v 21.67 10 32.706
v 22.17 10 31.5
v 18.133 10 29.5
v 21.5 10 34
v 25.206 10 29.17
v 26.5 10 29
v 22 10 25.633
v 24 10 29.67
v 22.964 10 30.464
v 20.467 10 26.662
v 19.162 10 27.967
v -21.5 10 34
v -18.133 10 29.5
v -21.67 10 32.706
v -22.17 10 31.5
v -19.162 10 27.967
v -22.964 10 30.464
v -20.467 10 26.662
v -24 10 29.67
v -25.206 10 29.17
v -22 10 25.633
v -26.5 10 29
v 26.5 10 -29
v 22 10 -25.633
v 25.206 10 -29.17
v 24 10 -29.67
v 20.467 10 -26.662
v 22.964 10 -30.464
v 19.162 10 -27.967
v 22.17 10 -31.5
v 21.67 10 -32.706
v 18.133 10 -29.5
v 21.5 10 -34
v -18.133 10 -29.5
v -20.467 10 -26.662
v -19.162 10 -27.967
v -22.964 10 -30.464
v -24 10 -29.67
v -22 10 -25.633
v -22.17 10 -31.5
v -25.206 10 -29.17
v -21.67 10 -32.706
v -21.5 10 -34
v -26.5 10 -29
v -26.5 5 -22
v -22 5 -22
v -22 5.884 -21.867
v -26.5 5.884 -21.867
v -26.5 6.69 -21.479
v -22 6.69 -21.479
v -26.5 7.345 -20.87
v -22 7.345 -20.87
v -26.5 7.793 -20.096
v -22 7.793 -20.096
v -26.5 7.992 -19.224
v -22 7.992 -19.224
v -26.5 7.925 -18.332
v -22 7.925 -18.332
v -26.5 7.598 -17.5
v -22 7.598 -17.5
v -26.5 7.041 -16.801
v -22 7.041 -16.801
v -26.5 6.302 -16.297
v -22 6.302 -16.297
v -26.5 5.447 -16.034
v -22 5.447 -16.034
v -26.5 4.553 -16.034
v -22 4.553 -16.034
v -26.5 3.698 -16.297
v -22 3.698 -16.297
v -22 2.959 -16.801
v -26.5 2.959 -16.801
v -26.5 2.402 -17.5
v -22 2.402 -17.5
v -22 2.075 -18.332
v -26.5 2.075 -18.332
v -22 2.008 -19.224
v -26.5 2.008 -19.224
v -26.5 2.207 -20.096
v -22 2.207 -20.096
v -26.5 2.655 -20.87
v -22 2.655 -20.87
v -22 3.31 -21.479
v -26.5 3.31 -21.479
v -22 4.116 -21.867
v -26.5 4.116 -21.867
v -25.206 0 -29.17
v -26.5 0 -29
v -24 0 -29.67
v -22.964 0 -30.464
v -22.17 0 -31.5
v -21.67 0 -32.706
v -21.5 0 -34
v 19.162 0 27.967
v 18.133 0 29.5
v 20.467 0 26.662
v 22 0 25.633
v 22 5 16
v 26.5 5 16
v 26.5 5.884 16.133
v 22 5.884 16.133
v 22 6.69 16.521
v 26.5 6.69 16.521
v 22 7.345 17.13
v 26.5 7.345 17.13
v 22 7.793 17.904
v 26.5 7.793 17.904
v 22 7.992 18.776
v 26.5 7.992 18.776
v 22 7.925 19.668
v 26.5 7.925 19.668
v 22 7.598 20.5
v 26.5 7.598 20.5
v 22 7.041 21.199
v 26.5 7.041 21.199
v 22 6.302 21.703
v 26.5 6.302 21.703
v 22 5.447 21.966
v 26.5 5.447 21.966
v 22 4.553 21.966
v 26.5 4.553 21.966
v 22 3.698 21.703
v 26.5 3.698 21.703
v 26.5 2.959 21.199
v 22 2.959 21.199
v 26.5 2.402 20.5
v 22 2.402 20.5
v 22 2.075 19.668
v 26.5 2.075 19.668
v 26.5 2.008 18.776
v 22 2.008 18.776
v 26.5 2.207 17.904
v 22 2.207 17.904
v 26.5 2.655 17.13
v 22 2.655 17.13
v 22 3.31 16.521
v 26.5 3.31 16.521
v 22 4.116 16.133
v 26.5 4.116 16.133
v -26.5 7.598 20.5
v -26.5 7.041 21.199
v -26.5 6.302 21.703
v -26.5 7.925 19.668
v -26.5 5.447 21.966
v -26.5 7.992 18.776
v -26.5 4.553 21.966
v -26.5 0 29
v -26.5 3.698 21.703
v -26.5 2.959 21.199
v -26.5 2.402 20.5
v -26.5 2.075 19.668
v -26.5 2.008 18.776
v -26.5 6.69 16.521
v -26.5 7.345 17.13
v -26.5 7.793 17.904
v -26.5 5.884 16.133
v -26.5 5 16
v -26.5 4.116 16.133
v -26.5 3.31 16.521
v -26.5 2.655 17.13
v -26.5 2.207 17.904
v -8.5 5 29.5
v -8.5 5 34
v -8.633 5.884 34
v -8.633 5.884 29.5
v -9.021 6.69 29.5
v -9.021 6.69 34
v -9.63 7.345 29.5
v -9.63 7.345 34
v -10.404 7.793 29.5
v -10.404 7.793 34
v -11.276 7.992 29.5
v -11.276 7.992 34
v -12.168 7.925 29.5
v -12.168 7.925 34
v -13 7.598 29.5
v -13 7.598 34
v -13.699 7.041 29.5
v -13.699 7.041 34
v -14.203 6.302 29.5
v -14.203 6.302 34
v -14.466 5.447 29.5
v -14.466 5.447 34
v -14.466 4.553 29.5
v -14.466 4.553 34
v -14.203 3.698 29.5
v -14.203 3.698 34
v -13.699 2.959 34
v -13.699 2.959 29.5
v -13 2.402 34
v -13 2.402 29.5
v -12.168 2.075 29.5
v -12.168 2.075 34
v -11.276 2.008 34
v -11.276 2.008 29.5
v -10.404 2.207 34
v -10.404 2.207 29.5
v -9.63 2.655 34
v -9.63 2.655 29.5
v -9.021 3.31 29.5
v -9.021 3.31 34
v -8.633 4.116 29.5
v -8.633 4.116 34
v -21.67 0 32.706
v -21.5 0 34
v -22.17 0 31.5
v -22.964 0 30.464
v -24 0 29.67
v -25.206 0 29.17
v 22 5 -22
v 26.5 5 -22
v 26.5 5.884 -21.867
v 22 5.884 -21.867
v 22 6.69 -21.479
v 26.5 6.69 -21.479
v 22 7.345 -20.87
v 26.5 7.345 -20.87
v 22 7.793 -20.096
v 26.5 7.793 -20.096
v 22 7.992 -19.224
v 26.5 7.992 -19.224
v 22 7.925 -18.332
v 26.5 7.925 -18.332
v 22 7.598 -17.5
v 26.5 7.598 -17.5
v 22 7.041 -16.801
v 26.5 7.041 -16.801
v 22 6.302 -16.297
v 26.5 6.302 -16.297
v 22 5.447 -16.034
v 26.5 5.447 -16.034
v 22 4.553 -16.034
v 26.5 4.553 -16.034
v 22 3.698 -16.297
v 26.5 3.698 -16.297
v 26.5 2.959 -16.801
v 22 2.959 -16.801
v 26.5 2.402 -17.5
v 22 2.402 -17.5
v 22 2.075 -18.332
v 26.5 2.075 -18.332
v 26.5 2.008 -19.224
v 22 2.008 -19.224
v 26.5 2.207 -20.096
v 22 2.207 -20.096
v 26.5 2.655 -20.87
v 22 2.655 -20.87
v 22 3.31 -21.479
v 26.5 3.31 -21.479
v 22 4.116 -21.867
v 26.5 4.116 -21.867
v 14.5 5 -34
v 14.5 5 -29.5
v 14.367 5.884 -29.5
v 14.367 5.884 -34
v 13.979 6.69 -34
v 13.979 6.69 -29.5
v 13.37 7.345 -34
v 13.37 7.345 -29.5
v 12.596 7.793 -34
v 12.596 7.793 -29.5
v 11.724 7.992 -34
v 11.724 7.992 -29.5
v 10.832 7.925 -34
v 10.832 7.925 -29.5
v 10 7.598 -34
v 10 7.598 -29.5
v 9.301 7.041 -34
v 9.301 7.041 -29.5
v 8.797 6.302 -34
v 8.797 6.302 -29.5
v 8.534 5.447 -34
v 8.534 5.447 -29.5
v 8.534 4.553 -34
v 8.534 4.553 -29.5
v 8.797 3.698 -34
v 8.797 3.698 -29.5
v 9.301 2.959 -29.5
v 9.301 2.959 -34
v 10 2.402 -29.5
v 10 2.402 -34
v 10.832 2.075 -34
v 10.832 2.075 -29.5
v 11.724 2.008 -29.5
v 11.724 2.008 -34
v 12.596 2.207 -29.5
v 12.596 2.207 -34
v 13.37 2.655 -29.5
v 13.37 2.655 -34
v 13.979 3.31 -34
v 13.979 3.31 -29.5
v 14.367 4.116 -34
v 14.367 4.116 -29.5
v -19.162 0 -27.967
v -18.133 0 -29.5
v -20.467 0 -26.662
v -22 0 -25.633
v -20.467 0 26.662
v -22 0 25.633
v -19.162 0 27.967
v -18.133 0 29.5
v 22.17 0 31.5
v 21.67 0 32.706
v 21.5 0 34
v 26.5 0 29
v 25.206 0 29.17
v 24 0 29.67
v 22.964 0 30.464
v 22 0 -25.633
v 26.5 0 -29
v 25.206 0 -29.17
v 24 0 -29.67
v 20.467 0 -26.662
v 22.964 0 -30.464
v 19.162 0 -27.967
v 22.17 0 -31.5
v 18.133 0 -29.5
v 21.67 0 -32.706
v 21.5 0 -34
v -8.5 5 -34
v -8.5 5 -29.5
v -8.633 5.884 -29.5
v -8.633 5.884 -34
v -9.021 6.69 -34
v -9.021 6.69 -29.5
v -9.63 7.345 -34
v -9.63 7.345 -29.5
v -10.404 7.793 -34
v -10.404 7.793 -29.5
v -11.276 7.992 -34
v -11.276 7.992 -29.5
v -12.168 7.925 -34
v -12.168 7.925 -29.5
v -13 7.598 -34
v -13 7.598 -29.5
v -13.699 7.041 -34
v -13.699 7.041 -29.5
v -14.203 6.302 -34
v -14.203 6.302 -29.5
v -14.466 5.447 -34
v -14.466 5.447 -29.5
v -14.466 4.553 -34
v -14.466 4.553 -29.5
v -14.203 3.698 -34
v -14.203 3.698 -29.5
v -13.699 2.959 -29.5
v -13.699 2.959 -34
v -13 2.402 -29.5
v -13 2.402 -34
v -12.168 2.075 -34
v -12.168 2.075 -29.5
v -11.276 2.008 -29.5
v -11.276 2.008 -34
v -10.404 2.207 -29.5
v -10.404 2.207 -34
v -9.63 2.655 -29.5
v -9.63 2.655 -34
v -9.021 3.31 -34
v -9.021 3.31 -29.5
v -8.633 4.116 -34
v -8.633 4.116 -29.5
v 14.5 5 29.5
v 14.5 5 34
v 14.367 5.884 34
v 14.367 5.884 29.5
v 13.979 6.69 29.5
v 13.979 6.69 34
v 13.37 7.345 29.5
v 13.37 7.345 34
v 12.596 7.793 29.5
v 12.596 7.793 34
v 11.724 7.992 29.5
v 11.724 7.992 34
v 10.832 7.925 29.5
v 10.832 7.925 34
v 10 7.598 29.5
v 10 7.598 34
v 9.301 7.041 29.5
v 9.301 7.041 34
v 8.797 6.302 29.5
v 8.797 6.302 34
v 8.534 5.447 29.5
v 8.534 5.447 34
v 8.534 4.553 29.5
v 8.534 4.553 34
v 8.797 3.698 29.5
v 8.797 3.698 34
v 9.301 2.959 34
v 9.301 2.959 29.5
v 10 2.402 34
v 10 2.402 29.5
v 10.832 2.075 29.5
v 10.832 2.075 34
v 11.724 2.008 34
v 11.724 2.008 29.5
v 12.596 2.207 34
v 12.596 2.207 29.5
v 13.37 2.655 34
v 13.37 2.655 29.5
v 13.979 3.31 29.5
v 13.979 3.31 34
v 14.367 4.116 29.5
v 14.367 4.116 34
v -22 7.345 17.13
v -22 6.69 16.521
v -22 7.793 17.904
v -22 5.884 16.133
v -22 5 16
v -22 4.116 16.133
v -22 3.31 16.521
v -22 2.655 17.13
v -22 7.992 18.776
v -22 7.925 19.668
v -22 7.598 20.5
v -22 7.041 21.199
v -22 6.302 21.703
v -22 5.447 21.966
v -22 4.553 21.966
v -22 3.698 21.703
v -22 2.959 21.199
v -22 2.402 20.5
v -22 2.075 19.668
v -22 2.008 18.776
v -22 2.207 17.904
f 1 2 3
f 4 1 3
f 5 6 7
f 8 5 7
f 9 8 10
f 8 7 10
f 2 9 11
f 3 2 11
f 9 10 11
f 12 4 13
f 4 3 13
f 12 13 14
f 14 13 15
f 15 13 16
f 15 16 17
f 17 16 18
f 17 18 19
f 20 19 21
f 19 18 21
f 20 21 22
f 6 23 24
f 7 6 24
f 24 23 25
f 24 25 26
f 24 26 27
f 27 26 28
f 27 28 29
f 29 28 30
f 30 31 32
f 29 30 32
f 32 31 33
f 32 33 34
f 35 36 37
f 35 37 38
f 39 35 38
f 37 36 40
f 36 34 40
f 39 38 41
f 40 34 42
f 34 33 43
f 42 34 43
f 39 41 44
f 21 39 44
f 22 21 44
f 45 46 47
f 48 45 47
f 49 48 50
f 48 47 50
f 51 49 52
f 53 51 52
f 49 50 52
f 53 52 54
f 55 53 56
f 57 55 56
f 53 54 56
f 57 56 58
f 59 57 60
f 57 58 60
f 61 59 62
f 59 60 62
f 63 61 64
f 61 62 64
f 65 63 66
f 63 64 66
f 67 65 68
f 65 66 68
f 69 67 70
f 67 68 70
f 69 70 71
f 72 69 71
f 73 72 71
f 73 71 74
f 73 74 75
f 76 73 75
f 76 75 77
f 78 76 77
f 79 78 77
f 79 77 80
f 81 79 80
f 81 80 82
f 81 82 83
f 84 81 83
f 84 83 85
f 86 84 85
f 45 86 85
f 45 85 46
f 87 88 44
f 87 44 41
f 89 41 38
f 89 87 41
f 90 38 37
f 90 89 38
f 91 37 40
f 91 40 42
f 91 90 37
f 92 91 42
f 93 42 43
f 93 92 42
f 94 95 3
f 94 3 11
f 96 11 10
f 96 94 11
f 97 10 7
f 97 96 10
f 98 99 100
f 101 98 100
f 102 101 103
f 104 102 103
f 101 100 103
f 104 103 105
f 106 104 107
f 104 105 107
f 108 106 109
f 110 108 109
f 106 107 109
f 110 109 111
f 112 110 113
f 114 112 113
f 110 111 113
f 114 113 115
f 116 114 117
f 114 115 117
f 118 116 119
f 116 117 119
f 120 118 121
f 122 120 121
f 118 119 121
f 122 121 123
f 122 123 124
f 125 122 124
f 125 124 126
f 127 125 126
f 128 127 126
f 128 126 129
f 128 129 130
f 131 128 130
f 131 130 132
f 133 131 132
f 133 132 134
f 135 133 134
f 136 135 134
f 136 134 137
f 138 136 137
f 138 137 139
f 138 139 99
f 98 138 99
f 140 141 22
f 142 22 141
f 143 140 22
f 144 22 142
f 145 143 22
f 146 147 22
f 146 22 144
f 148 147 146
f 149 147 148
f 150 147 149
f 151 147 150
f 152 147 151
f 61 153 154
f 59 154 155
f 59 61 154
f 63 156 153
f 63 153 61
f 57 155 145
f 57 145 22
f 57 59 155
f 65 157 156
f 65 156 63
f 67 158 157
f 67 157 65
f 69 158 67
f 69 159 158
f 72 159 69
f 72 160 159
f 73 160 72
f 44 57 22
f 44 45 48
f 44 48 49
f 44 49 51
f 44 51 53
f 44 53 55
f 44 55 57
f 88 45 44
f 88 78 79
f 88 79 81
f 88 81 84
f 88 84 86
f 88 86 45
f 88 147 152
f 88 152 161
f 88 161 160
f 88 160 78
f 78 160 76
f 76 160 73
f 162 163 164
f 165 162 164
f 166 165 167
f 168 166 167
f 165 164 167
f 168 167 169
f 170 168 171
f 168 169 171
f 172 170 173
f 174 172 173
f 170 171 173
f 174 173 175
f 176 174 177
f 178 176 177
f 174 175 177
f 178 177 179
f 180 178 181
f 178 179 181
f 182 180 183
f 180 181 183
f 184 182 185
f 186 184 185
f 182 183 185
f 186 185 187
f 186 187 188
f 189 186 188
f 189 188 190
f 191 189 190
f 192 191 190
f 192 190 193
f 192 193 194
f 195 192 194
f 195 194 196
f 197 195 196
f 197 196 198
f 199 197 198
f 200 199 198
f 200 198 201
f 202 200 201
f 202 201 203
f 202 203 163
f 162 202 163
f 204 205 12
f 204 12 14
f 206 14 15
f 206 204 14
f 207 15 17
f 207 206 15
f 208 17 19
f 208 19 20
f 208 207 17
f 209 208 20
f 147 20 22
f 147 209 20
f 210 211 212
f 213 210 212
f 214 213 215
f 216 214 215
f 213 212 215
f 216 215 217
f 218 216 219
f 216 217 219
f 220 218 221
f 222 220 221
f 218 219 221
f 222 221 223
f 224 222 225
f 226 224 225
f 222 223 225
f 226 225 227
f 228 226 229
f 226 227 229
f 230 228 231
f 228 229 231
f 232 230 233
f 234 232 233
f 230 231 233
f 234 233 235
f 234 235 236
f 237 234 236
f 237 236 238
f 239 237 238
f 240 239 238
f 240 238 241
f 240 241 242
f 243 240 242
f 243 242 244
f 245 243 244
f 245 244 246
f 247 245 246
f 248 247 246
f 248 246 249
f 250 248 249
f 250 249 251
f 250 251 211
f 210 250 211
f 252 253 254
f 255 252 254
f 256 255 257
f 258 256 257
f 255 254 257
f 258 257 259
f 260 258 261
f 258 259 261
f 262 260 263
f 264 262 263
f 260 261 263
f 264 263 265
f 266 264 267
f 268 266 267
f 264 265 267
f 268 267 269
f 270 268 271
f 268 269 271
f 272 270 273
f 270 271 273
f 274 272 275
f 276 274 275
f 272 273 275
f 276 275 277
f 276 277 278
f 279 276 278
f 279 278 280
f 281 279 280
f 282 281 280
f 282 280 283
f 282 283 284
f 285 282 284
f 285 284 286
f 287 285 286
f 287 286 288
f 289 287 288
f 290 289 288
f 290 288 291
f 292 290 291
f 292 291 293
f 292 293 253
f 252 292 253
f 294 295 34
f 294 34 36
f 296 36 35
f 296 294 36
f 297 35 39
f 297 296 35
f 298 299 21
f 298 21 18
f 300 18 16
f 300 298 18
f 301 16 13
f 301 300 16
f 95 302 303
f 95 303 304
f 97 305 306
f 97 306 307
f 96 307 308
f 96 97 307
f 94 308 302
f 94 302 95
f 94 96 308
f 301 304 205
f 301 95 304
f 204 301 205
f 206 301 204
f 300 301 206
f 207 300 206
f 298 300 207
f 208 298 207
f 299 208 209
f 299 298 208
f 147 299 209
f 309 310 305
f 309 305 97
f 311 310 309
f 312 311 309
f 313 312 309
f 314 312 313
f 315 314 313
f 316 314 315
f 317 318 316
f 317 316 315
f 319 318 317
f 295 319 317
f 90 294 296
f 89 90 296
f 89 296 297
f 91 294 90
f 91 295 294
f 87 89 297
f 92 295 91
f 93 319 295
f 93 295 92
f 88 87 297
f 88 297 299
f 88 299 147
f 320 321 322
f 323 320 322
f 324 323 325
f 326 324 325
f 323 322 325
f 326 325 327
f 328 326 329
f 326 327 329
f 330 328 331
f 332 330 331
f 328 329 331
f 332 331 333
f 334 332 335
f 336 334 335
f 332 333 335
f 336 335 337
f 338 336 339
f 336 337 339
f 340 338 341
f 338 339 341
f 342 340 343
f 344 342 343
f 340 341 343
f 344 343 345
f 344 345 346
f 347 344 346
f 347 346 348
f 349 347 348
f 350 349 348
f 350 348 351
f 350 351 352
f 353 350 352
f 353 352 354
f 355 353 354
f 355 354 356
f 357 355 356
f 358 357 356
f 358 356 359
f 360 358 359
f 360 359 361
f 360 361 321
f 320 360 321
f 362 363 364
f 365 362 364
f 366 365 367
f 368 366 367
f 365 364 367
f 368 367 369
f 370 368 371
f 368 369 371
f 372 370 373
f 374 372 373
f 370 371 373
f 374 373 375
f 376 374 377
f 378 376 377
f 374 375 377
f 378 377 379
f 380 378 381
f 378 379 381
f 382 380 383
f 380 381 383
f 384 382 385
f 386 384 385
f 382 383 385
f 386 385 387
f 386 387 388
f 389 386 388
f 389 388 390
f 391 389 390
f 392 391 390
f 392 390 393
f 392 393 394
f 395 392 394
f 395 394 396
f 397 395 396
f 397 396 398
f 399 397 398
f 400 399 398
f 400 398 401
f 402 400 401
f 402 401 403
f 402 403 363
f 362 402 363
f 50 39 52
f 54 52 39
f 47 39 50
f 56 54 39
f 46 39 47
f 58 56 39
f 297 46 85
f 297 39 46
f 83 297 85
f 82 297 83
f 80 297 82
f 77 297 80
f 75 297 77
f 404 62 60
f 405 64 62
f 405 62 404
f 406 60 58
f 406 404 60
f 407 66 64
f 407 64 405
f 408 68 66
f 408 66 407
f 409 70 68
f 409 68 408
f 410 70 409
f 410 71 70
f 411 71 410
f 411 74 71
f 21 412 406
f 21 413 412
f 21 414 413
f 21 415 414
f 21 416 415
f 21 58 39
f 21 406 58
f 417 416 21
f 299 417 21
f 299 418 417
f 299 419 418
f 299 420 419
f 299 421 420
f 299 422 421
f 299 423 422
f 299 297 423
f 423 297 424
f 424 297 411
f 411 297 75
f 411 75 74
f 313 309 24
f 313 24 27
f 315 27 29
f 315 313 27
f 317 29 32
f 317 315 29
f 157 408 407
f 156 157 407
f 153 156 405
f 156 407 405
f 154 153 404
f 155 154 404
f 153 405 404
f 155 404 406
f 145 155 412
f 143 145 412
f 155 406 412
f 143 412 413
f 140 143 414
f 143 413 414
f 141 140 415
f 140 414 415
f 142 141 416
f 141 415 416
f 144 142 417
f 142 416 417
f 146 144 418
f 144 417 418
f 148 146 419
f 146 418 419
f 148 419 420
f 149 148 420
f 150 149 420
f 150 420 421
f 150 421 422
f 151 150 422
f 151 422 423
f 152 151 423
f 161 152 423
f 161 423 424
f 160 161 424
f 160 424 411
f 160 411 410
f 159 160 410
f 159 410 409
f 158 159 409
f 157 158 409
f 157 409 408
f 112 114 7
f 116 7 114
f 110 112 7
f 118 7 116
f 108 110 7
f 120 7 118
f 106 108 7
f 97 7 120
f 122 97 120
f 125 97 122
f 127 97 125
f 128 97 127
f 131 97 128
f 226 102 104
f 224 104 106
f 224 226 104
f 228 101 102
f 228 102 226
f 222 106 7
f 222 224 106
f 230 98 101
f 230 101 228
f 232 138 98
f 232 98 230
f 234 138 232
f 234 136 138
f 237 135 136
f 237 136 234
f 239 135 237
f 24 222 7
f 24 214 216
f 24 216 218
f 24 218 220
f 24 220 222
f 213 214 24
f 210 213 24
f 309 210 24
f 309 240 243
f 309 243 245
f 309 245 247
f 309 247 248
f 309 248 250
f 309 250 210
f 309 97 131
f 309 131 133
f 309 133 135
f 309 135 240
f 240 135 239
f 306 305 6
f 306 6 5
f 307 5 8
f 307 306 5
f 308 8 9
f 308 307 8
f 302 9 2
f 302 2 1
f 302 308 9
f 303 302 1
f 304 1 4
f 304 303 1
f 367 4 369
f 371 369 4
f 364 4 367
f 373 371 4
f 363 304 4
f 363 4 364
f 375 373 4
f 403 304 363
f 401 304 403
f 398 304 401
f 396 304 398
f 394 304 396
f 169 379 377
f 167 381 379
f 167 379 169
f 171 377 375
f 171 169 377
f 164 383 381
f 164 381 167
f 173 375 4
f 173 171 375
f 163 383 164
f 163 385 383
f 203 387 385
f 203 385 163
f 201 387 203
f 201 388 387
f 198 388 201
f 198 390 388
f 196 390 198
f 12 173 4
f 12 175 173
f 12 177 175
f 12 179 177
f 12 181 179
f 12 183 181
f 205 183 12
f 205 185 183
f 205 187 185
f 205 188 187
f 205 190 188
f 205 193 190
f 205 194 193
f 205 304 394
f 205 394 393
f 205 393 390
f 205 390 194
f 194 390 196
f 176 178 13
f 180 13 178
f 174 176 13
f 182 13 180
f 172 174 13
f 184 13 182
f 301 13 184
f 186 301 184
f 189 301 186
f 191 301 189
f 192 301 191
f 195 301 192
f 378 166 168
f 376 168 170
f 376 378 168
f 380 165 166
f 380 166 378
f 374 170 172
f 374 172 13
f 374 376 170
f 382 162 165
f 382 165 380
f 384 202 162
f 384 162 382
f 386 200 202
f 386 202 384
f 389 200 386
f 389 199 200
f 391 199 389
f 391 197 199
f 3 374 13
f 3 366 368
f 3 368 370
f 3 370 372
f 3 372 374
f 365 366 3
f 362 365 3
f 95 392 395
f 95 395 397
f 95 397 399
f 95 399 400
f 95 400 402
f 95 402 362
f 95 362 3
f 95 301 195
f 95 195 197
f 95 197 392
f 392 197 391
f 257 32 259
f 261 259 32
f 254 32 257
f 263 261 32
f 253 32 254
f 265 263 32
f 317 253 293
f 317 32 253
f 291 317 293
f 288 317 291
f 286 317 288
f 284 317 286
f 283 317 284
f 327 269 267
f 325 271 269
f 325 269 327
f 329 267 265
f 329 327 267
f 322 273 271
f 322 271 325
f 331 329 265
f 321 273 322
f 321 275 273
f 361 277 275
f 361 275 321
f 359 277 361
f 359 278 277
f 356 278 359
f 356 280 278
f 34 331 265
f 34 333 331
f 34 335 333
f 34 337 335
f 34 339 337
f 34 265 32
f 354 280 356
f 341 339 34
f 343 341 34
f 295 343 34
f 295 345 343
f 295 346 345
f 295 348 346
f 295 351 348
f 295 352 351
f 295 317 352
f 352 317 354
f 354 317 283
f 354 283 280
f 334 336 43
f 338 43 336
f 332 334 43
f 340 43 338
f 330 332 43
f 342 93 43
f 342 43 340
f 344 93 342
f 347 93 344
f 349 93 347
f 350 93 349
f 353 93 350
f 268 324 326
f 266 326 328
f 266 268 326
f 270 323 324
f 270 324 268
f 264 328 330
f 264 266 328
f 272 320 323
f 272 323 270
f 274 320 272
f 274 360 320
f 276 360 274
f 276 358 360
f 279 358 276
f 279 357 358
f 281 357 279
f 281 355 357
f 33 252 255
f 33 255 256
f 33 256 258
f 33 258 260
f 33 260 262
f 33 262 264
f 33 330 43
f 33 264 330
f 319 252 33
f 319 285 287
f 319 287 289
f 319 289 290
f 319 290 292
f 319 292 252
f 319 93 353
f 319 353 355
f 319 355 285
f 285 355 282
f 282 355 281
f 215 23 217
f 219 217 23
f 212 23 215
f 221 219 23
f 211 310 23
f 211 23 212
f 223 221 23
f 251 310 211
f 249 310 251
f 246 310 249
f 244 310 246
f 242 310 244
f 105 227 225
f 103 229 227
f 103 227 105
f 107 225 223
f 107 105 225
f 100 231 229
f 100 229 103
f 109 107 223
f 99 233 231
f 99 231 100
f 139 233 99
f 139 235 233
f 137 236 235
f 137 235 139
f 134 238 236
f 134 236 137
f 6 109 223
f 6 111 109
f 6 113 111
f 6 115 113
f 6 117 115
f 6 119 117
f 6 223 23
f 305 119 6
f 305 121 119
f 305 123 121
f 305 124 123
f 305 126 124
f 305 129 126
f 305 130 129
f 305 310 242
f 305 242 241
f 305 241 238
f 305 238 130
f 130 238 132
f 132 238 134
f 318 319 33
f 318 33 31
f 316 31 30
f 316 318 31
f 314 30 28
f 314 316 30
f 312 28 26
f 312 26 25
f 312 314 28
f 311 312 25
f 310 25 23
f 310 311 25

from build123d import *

# Parameters (mm, degrees)
BOSS_EXTRUDE1_DEPTH = 10
SKETCH2_R           = 3
CUT_EXTRUDE1_DEPTH  = 64.757352517
SKETCH3_R           = 3
CUT_EXTRUDE2_DEPTH  = 74.663084377


with BuildPart() as part:
    # Sketch1 → Boss-Extrude1 (new body)
    with BuildSketch(Plane(origin=(0, 0, 0), x_dir=(1, 0, 0), z_dir=(0, 1, 0))):
        with BuildLine():
            Line((-21.5, 34), (21.5, 34))
            ThreePointArc((21.5, 34), (22.964466094, 30.464466094), (26.5, 29))
            Line((26.5, 29), (26.5, -29))
            ThreePointArc((26.5, -29), (22.964466094, -30.464466094), (21.5, -34))
            Line((21.5, -34), (-21.5, -34))
            ThreePointArc((-21.5, -34), (-22.964466094, -30.464466094), (-26.5, -29))
            Line((-26.5, -29), (-26.5, 29))
            ThreePointArc((-26.5, 29), (-22.964466094, 30.464466094), (-21.5, 34))
        make_face()
        with BuildLine():
            Line((-22, 25.633399735), (-22, -25.633399735))
            ThreePointArc((-22, -25.633399735), (-19.782485579, -27.282485579), (-18.133399735, -29.5))
            Line((-18.133399735, -29.5), (18.133399735, -29.5))
            ThreePointArc((18.133399735, -29.5), (19.782485579, -27.282485579), (22, -25.633399735))
            Line((22, -25.633399735), (22, 25.633399735))
            ThreePointArc((22, 25.633399735), (19.782485579, 27.282485579), (18.133399735, 29.5))
            Line((18.133399735, 29.5), (-18.133399735, 29.5))
            ThreePointArc((-18.133399735, 29.5), (-19.782485579, 27.282485579), (-22, 25.633399735))
        make_face(mode=Mode.SUBTRACT)
    extrude(amount=BOSS_EXTRUDE1_DEPTH)

    # Sketch2 → Cut-Extrude1 (cut, through all)
    with BuildSketch(Plane(origin=(26.5, 0, 0), x_dir=(0, 0, -1), z_dir=(1, 0, 0))):
        with Locations((-19, 5)):
            Circle(SKETCH2_R)
        with Locations((19, 5)):
            Circle(SKETCH2_R)
    extrude(amount=-CUT_EXTRUDE1_DEPTH, mode=Mode.SUBTRACT)

    # Sketch3 → Cut-Extrude2 (cut, through all)
    with BuildSketch(Plane.XY.offset(34)):
        with Locations((11.5, 5)):
            Circle(SKETCH3_R)
        with Locations((-11.5, 5)):
            Circle(SKETCH3_R)
    extrude(amount=-CUT_EXTRUDE2_DEPTH, mode=Mode.SUBTRACT)


solid = part.part
